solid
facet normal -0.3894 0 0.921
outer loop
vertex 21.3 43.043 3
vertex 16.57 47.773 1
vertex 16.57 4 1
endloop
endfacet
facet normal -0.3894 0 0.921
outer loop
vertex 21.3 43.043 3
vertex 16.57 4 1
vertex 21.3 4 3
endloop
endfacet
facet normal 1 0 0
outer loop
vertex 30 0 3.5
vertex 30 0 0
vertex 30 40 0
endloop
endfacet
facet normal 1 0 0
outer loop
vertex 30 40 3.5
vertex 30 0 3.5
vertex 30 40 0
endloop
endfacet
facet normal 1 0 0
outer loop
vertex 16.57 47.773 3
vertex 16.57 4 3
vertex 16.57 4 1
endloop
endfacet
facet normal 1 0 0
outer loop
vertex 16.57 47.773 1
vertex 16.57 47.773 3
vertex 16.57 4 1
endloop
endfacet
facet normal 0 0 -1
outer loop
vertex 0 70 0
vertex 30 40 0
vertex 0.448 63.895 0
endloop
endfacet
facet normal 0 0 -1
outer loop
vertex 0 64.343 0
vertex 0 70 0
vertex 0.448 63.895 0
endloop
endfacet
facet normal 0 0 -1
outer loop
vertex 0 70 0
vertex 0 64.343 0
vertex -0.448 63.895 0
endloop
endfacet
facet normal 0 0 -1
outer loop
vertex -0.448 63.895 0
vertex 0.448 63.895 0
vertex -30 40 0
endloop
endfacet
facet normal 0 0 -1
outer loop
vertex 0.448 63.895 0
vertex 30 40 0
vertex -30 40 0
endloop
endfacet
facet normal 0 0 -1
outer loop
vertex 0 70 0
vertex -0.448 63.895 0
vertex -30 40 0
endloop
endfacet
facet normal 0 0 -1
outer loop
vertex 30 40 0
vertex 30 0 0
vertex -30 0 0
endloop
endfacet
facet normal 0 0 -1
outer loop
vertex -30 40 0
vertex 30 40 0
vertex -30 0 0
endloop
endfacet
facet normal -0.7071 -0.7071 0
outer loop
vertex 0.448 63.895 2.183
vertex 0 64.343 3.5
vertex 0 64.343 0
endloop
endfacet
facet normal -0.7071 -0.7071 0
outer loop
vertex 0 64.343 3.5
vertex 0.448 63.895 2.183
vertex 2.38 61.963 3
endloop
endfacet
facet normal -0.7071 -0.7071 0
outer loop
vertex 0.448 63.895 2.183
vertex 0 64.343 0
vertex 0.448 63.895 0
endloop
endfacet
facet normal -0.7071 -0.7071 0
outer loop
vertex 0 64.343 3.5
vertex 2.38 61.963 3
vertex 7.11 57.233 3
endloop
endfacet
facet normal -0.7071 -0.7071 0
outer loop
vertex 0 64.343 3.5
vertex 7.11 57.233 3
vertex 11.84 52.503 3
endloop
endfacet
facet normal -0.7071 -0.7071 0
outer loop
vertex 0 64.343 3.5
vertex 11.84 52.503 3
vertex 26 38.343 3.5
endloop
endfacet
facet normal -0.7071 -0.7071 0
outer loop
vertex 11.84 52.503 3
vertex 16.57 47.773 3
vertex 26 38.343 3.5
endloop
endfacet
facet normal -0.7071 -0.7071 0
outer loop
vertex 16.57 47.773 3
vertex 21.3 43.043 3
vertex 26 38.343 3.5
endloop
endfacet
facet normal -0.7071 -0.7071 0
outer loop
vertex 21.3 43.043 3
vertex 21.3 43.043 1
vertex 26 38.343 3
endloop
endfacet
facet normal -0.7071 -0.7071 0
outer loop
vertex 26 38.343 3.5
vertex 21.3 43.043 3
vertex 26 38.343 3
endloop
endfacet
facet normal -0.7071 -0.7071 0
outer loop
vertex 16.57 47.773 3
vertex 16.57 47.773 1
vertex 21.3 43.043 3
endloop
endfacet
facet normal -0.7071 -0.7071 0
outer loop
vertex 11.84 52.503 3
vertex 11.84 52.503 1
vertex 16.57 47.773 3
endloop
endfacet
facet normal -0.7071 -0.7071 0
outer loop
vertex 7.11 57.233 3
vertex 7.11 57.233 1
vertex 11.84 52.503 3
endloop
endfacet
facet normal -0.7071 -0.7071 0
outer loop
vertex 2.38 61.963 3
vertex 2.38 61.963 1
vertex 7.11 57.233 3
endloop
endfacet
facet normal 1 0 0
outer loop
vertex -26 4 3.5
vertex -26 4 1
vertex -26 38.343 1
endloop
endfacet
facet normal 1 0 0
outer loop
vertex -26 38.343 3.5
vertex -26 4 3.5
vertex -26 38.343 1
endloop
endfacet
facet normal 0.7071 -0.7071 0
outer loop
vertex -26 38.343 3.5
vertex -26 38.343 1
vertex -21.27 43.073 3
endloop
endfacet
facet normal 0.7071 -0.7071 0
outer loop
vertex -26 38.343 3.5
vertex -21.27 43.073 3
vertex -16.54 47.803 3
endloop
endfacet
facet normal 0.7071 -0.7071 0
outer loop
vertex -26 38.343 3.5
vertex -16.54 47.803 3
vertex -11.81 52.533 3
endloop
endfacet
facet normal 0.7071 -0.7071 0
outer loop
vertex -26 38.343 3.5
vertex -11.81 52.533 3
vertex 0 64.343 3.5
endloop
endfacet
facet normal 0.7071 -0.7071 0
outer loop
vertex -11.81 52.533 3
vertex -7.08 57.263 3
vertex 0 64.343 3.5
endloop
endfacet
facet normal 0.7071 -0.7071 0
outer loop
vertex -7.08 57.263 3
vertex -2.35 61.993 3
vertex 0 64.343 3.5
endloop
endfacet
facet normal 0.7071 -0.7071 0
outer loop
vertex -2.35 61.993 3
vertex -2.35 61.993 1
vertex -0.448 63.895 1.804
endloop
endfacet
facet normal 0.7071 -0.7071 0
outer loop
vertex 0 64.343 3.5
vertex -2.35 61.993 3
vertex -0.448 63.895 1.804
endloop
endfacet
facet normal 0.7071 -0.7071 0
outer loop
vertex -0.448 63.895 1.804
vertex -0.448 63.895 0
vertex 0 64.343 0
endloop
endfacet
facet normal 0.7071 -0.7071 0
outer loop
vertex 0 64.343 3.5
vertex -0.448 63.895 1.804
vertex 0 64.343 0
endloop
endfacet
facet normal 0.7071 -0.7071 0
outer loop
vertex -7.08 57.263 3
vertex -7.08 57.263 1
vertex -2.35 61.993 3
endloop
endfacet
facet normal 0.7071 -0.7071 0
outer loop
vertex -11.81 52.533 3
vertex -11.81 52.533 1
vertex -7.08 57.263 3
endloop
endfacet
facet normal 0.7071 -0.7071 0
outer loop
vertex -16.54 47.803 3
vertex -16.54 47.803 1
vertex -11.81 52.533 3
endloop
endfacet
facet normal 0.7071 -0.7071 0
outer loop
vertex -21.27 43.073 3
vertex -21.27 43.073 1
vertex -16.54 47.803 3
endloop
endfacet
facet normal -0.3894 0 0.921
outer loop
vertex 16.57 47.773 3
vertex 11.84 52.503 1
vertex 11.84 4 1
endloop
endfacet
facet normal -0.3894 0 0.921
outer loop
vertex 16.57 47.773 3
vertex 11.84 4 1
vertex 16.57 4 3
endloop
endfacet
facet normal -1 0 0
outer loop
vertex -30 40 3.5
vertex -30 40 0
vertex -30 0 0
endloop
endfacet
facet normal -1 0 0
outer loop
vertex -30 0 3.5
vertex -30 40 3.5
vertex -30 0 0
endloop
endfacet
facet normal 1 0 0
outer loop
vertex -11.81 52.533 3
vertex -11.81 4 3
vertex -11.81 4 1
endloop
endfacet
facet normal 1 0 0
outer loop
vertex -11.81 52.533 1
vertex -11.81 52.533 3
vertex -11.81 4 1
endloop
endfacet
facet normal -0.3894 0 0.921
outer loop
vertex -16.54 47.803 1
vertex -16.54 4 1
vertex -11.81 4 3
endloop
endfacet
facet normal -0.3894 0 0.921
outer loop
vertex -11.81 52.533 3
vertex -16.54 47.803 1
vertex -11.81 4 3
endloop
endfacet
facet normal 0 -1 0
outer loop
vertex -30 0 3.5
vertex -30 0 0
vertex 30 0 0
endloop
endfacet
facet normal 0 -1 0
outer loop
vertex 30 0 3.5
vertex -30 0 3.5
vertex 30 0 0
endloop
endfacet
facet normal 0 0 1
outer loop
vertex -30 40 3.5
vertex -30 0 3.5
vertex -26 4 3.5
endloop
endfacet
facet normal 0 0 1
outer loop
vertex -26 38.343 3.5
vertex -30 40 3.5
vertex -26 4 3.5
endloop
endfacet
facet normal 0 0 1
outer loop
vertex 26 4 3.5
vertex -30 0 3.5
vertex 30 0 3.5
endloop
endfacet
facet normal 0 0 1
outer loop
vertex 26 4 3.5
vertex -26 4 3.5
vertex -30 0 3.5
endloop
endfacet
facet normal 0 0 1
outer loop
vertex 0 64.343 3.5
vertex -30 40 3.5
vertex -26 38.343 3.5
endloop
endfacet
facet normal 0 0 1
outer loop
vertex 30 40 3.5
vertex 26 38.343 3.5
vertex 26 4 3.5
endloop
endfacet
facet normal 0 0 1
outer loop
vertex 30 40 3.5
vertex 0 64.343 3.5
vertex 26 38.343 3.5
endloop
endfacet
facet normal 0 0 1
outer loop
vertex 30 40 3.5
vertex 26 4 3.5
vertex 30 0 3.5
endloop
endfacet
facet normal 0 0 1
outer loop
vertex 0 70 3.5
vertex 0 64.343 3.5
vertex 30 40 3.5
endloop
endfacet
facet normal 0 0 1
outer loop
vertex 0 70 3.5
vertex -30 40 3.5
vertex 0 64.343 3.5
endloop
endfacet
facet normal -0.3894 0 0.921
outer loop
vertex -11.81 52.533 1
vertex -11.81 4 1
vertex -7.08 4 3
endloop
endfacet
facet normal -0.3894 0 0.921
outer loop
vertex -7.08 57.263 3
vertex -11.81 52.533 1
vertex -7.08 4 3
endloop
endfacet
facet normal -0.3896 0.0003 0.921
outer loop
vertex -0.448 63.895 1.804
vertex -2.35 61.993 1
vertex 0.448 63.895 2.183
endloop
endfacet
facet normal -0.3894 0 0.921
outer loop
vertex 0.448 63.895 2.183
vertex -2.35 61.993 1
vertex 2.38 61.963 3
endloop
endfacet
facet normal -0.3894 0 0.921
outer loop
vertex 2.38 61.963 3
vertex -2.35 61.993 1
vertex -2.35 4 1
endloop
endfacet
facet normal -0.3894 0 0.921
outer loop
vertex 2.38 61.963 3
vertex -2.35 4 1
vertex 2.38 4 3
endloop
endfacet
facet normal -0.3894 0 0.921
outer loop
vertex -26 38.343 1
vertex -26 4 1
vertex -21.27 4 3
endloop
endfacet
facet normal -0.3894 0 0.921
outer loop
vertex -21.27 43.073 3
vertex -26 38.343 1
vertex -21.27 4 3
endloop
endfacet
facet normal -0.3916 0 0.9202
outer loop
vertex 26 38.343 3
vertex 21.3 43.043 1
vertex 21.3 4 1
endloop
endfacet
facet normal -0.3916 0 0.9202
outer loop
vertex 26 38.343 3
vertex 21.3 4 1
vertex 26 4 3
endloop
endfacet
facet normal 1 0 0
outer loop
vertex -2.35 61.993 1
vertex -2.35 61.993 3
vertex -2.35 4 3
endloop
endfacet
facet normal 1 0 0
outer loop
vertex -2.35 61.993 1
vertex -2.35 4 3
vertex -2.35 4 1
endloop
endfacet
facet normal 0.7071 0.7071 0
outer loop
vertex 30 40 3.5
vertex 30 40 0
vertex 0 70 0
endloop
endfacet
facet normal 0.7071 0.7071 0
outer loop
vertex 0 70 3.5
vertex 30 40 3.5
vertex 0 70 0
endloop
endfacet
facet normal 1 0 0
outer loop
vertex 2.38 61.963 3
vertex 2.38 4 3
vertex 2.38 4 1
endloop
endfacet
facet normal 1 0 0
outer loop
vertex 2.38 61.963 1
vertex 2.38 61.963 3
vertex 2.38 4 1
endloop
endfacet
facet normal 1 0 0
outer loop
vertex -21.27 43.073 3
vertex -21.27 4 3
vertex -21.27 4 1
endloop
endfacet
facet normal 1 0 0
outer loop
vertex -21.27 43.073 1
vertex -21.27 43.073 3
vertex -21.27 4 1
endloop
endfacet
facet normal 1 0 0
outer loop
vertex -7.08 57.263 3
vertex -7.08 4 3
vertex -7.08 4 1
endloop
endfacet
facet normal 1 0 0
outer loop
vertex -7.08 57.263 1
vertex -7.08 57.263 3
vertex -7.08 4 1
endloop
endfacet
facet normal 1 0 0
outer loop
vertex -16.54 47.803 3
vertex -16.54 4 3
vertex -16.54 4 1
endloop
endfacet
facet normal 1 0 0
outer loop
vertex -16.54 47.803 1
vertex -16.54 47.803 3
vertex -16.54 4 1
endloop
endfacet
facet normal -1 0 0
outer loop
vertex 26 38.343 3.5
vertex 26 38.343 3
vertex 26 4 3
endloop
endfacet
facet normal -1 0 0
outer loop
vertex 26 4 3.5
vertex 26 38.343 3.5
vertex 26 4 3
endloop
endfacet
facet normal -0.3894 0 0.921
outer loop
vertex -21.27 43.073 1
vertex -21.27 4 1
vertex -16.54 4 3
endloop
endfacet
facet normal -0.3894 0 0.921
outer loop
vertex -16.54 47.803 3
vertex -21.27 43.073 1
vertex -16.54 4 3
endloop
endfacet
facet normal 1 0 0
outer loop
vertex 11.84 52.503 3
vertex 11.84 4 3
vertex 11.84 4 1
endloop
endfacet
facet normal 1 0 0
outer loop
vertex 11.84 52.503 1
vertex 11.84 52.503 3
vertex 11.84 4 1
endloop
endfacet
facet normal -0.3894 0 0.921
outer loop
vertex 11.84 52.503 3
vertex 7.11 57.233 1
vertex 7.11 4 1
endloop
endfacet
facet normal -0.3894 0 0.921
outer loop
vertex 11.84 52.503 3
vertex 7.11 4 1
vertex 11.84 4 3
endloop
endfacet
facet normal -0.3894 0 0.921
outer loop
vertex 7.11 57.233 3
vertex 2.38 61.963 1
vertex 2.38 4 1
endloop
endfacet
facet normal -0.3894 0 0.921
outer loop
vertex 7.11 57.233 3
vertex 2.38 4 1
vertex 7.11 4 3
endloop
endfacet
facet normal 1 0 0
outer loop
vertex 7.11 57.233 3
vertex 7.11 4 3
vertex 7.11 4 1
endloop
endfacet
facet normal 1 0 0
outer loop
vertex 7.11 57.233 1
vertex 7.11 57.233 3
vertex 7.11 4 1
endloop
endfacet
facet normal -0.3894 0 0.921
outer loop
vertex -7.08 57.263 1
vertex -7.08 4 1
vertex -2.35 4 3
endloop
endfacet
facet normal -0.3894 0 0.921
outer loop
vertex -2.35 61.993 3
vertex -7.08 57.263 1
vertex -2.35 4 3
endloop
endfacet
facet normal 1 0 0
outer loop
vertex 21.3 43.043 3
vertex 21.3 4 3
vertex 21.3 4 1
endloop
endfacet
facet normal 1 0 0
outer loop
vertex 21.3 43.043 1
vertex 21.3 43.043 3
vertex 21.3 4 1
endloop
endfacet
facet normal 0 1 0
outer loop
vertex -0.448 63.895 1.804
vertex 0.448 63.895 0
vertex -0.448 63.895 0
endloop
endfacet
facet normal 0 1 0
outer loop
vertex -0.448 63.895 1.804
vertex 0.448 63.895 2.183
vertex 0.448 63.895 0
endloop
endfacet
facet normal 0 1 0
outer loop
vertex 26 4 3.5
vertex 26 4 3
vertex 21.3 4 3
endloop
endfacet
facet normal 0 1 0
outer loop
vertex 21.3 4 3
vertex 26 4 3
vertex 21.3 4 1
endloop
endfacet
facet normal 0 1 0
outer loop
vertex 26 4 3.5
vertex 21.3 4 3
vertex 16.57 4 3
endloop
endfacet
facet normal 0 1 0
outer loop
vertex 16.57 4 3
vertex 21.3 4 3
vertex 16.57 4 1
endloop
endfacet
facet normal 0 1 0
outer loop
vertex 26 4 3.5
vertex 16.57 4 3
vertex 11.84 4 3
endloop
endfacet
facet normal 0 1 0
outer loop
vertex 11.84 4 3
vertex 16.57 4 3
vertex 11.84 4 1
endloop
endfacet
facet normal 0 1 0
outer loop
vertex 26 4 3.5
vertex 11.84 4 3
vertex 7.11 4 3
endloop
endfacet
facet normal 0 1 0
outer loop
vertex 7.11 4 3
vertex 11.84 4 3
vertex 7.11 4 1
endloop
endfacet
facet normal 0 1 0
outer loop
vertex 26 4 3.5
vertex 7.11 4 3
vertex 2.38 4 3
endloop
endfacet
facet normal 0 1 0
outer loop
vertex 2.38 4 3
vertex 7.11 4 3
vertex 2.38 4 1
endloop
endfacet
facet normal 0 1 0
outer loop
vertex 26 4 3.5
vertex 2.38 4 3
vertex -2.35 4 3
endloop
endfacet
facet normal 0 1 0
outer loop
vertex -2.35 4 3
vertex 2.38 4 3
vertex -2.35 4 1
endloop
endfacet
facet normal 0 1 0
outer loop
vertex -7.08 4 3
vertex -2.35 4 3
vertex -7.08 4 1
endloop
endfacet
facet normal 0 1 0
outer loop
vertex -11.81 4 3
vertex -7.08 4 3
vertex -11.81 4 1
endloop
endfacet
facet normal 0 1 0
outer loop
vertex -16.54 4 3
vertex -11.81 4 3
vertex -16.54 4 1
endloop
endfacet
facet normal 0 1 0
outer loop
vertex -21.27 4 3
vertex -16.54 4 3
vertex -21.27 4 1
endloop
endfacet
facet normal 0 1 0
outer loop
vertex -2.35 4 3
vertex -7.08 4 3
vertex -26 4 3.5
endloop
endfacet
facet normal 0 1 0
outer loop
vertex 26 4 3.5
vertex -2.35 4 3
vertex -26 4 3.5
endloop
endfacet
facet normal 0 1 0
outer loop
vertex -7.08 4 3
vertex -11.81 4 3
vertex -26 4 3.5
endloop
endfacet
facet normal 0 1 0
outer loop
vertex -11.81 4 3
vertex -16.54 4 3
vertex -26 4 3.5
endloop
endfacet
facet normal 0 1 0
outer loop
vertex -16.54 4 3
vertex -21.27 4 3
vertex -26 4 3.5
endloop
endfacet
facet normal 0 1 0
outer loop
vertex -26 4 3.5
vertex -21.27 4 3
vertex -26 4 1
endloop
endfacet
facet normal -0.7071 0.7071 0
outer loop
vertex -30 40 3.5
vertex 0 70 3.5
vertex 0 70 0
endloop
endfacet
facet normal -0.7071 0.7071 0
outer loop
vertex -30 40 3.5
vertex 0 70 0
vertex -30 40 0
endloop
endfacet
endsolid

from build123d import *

# Parameters (mm, degrees)
F1_DEPTH = 3.5
F3_DEPTH = 59.89472
F4_W     = 42.426407
F4_H     = 3.5
F5_DEPTH = 25.9868
F6_W     = 42.426407
F6_H     = 3.5
F7_DEPTH = 37.73951


with BuildPart() as f1:
    # F0 (on Top) → F1 (new body)
    with BuildSketch(Plane.XY):
        Polygon((-30, 0), (0, 0), (30, 0), (30, 40), (0, 70), (-30, 40), align=None)
        Polygon((26, 4), (-26, 4), (-26, 38.343146), (-12.171573, 52.171573), (0, 64.343146), (26, 38.343146), align=None, mode=Mode.SUBTRACT)
    extrude(amount=F1_DEPTH)

    # F2 (on face) → F3 (join)
    with BuildSketch(Plane(origin=(0, 4, 0), x_dir=(-1, 0, 0), z_dir=(0, 1, 0))):
        Polygon((26, 0), (26, 1), (21.27, 3), (21.27, 1), (16.54, 3), (16.54, 1), (11.81, 3), (11.81, 1), (7.08, 3), (7.08, 1), (2.35, 3), (2.35, 1), (-2.38, 3), (-2.38, 1), (-7.11, 3), (-7.11, 1), (-11.84, 3), (-11.84, 1), (-16.57, 3), (-16.57, 1), (-21.3, 3), (-21.3, 1), (-26, 3), (-26, 0), align=None)
    extrude(amount=F3_DEPTH)

    # F4 (on face) → F5 (cut)
    with BuildSketch(Plane(origin=(35, 35, 0), x_dir=(-0.707107, 0.707107, 0), z_dir=(0.707107, 0.707107, 0))):
        with Locations((28.284271, 1.75)):
            Rectangle(F4_W, F4_H)
    extrude(amount=F5_DEPTH, mode=Mode.SUBTRACT)

    # F6 (on face) → F7 (cut)
    with BuildSketch(Plane(origin=(-35, 35, 0), x_dir=(-0.707107, -0.707107, 0), z_dir=(-0.707107, 0.707107, 0))):
        with Locations((-28.284271, 1.75)):
            Rectangle(F6_W, F6_H)
    extrude(amount=F7_DEPTH, mode=Mode.SUBTRACT)


solid = f1.part
